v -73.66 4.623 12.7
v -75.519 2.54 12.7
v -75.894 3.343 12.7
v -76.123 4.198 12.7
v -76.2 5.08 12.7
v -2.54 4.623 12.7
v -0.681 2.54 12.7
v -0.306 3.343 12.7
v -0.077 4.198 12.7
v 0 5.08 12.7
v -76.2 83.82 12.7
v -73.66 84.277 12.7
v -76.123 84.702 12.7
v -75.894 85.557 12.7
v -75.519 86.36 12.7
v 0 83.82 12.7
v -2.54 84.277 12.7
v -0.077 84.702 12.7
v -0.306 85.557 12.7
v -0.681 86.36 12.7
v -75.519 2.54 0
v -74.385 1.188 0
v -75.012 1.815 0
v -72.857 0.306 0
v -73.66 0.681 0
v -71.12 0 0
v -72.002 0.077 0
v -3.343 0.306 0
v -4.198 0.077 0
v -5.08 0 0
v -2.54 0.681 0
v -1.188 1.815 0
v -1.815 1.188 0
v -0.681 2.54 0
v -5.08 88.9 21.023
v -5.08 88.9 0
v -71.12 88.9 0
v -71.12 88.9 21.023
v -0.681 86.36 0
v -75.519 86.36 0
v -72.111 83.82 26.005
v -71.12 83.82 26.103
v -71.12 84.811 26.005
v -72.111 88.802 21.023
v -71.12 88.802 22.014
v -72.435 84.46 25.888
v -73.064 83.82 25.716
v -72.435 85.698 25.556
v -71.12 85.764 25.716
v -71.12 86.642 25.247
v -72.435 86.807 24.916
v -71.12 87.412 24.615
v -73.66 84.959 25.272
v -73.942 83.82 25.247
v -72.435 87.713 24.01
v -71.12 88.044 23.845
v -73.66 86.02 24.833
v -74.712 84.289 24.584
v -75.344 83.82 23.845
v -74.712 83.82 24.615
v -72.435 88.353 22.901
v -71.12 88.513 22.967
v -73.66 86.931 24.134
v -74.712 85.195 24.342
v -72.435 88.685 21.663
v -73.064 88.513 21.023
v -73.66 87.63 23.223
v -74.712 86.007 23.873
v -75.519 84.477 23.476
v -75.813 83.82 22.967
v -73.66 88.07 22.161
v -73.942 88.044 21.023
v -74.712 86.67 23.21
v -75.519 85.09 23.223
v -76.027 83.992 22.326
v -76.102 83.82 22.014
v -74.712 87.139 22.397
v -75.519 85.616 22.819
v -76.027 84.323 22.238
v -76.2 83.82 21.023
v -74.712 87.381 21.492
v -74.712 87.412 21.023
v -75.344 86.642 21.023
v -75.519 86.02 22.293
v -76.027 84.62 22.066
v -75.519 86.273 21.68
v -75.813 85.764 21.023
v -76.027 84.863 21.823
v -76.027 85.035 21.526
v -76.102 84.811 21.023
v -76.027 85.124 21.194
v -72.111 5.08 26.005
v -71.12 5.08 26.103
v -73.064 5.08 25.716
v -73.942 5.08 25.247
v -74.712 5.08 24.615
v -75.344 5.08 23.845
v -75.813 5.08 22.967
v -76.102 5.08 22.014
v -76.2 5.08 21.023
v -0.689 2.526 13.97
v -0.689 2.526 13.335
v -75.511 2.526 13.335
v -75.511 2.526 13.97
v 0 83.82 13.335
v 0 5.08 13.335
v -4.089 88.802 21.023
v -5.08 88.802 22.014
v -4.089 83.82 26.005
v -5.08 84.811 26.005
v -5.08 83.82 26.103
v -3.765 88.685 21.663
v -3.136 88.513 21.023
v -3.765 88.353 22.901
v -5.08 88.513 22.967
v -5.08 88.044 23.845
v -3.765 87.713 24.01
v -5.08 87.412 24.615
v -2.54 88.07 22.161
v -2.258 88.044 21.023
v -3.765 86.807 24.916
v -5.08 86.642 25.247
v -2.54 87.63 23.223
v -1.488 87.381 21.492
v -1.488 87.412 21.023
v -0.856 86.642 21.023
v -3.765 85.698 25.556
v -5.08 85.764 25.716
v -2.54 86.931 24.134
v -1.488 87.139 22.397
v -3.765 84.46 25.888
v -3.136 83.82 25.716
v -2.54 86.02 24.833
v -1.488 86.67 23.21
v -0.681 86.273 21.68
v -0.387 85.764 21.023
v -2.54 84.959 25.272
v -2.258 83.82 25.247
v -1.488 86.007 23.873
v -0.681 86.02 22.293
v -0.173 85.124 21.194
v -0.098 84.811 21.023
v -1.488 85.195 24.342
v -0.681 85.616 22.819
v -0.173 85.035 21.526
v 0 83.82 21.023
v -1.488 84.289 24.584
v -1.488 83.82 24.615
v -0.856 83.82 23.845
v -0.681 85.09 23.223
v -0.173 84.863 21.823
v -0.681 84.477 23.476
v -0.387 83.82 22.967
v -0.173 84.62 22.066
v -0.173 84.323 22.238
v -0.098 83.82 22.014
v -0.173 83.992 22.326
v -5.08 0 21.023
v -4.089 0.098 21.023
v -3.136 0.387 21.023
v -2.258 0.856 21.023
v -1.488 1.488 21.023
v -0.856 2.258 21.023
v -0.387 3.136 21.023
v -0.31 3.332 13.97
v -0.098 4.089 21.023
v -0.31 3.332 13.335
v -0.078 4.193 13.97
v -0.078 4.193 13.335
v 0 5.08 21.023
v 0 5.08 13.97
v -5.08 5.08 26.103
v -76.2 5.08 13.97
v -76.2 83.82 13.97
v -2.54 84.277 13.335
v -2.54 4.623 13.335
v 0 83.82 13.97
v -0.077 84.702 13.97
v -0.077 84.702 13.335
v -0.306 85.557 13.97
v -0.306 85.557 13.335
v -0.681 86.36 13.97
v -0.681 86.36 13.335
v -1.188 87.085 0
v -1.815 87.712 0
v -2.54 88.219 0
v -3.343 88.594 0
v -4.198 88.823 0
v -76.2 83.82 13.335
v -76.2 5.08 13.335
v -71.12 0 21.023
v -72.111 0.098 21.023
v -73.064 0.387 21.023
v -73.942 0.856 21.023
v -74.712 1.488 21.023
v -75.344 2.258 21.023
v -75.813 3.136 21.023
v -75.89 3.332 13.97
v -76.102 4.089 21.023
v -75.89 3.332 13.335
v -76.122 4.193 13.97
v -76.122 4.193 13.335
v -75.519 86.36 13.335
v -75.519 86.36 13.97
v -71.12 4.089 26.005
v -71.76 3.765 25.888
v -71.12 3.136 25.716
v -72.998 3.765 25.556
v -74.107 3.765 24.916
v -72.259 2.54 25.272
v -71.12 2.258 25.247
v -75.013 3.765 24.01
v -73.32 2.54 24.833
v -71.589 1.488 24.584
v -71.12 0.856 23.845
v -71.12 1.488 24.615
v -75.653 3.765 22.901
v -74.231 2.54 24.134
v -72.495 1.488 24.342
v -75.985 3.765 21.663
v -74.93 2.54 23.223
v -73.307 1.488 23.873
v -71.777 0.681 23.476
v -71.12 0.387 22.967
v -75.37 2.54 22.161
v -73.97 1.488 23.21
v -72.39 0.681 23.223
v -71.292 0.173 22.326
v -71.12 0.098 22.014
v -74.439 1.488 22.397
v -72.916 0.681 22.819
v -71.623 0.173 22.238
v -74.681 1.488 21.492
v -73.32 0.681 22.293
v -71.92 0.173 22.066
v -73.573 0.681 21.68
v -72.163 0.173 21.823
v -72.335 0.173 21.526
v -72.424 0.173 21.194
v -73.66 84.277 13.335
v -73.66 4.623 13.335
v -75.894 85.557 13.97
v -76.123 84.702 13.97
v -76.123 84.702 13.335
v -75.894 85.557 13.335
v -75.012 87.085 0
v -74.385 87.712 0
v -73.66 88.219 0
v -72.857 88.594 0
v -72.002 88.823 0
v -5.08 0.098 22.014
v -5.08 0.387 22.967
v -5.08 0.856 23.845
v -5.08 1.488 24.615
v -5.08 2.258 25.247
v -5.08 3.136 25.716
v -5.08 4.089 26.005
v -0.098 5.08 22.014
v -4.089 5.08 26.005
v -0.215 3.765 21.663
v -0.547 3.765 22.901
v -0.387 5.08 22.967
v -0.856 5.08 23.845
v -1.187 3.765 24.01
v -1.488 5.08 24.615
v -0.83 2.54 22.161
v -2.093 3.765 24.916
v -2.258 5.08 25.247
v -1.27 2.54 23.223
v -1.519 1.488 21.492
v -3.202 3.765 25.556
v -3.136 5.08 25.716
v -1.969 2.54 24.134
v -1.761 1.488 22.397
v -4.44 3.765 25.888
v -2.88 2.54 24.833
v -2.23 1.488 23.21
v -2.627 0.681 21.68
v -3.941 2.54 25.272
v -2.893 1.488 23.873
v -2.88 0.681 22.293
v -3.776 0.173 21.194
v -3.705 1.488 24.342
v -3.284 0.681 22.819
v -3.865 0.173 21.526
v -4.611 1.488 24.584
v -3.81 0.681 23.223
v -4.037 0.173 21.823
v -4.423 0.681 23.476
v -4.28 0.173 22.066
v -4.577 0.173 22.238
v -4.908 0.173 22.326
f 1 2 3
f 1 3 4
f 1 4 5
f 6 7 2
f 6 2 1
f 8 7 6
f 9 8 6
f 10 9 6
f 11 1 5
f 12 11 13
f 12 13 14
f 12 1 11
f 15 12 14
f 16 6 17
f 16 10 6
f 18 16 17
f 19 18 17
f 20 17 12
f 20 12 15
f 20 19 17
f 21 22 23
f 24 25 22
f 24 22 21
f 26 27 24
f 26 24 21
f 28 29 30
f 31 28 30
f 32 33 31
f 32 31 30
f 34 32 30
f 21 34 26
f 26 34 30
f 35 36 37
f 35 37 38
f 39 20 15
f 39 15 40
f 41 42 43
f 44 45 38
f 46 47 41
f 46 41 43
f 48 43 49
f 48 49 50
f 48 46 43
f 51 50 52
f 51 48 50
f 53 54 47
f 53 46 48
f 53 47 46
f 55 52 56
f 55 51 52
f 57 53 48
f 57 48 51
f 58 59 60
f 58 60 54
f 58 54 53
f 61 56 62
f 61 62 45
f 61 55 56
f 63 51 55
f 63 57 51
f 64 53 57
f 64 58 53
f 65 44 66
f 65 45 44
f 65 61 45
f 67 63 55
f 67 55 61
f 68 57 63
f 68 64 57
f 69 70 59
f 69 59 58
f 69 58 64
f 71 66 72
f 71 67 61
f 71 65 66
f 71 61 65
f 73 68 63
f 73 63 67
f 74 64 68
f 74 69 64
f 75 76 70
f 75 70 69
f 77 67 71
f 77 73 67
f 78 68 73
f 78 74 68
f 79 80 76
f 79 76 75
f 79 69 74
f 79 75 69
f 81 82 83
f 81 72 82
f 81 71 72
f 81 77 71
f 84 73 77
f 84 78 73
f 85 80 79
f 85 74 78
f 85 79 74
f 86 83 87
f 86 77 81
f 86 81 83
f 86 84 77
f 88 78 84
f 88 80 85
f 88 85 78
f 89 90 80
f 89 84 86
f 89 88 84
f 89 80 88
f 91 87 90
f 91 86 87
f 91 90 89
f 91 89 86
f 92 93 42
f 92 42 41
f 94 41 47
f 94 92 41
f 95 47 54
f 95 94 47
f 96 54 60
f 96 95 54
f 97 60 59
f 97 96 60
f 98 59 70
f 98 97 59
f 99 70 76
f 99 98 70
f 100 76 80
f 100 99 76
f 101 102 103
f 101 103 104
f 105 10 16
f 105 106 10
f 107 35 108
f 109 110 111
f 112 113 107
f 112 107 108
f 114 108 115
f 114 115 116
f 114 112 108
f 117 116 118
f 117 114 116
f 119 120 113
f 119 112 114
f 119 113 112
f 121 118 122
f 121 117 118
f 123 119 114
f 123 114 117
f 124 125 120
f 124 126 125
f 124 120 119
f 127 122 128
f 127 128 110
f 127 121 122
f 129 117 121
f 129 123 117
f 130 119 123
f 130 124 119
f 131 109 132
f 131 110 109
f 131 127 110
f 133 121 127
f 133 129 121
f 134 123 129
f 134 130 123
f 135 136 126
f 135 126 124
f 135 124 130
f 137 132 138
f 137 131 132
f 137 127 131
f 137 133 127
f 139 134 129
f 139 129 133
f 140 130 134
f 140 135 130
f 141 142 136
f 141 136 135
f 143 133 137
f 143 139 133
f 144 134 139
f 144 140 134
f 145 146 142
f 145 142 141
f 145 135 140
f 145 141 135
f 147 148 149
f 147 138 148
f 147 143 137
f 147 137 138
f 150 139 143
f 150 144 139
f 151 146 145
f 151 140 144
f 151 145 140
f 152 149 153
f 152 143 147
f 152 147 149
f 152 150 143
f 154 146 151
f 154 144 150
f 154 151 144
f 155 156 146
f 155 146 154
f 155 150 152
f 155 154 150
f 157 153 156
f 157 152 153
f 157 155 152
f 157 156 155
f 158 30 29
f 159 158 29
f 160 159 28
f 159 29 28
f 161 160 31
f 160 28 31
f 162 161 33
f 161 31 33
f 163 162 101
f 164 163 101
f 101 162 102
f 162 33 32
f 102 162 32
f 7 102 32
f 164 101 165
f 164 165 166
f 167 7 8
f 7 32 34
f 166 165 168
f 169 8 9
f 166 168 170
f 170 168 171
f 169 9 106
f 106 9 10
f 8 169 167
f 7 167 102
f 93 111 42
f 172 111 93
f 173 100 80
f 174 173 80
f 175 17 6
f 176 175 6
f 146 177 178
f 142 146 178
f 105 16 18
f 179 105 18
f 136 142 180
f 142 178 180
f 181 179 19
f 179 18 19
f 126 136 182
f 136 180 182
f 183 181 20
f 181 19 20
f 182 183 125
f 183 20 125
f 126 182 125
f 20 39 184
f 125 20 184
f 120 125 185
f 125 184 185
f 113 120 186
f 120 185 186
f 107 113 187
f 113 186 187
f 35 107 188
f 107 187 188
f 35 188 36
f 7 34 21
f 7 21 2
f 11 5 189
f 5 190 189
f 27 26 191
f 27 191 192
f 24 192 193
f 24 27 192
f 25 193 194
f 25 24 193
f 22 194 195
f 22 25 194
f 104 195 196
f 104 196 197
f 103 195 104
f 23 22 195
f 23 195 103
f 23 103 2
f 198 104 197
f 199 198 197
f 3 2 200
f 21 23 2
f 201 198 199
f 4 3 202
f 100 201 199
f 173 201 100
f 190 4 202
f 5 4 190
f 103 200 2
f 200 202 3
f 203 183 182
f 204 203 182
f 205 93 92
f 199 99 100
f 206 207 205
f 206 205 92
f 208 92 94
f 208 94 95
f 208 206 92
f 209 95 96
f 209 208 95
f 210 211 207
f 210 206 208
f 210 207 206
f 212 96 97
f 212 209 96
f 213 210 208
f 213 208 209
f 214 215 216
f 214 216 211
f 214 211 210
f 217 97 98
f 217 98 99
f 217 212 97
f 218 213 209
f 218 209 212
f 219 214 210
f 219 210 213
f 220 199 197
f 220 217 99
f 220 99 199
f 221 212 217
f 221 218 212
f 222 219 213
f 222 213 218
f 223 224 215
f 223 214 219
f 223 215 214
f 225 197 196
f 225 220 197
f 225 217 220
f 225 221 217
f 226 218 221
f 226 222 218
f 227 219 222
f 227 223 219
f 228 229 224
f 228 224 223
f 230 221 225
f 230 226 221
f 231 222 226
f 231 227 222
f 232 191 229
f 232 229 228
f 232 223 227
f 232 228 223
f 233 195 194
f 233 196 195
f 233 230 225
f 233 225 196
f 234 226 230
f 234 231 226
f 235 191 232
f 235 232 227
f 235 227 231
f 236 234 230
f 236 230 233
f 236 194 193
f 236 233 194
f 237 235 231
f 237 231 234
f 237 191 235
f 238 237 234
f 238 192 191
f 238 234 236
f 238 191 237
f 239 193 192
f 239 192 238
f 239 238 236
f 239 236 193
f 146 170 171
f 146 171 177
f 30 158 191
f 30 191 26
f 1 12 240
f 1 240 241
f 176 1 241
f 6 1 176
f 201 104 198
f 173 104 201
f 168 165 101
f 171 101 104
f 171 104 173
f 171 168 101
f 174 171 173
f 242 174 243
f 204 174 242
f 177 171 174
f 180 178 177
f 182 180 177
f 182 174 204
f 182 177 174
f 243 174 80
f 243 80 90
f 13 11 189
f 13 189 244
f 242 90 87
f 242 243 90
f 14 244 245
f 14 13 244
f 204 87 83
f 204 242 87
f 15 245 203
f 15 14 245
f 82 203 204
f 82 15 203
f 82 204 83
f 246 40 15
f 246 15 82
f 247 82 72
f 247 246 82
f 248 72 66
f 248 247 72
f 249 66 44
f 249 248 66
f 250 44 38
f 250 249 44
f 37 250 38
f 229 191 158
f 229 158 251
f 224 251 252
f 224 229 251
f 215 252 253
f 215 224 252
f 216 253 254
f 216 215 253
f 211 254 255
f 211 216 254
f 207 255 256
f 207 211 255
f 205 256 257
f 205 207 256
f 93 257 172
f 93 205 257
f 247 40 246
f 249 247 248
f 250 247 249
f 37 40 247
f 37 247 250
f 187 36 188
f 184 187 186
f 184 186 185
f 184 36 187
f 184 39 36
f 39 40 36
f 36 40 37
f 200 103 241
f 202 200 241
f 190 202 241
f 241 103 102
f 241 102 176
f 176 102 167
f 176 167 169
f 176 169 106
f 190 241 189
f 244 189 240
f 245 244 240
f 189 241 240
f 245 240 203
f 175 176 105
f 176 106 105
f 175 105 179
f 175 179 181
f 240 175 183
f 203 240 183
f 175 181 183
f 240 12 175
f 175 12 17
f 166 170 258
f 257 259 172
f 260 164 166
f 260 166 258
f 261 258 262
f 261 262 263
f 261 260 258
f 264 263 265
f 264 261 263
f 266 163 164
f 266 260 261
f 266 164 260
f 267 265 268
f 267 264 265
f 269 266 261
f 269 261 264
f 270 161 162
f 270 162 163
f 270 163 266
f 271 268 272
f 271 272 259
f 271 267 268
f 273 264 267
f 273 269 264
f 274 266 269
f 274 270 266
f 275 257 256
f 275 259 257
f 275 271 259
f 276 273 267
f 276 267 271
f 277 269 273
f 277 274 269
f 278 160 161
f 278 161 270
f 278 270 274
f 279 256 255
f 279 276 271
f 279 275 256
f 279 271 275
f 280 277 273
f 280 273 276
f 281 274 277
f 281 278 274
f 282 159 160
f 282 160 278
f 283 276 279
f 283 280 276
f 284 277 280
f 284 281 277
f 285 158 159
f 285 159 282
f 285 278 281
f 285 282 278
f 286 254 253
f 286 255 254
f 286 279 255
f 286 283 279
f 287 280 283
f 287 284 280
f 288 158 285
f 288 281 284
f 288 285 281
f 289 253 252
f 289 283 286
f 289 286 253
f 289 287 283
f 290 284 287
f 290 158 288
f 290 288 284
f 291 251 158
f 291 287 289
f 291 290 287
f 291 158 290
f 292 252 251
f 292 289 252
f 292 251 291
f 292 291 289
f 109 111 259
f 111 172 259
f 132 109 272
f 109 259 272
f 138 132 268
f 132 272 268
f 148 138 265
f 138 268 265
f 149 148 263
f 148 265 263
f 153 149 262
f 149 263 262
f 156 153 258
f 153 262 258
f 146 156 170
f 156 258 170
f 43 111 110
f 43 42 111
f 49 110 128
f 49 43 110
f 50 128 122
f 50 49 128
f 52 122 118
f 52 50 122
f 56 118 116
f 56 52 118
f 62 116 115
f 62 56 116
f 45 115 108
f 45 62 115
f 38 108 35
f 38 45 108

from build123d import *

# Parameters (mm, degrees)
F1_DEPTH     = 76.2
F2_W         = 83.8339800673
F2_H         = 0.635
F3_DEPTH     = 76.201
F4_W         = 71.12
F4_H         = 79.6544
F5_DEPTH     = 1.27
F6_R         = 5.08
F7_T1_DEPTH  = 33.7228350816
F7_S5_W      = 5.08
F7_S5_H      = 5.08
F7_T6_DEPTH  = 5.08
F8_T1_DEPTH  = 33.7228350816
F8_S5_W      = 5.08
F8_S5_H      = 5.08
F8_T6_DEPTH  = 5.08
F9_T1_DEPTH  = 33.7228350816
F9_S5_W      = 5.08
F9_S5_H      = 5.08
F9_T6_DEPTH  = 5.08
F10_T1_DEPTH = 33.7228350816
F10_S5_W     = 5.08
F10_S5_H     = 5.08
F10_T6_DEPTH = 5.08


# Not quite as in the source:
# - a fillet or chamfer that OpenCascade refuses, or shapes differently, is made with other operations: its cross-section is extruded or revolved along the edge and cut away or added


with BuildPart() as f1:
    # F0 (on Right) → F1 (new body)
    with BuildSketch(Plane.YZ):
        Polygon((0, 26.1028350816), (0, 0), (2.54, 0), (2.54, 12.7), (86.36, 12.7), (86.36, 0), (88.9, 0), (88.9, 26.1028350816), align=None)
    extrude(amount=-F1_DEPTH)

    # F2 (on face) → F3 (cut, through all)
    with BuildSketch(Plane.YZ):
        with Locations((44.4430099664, 13.6525)):
            Rectangle(F2_W, F2_H)
    extrude(amount=-F3_DEPTH, mode=Mode.SUBTRACT)

    # F4 (on face) → F5 (cut)
    with BuildSketch(Plane(origin=(0, 0, 12.7), x_dir=(1, 0, 0), z_dir=(0, 0, -1))):
        with Locations((-38.1, -44.45)):
            Rectangle(F4_W, F4_H)
    extrude(amount=-F5_DEPTH, mode=Mode.SUBTRACT)

    # F6
    f6_edges = [f1.edges().sort_by_distance(p)[0] for p in [
        (-38.1, 0, 26.102835),
        (0, 44.45, 26.102835),
        (-38.1, 88.9, 26.102835),
        (-76.2, 44.45, 26.102835),
    ]]
    fillet(f6_edges, radius=F6_R)

    # F7: fillet of radius 5.08 on 1 edges, made by hand

    # F7_s2 → F7_t1 (cut)
    with BuildSketch(Plane.XY.offset(-12.7)):
        with BuildLine():
            ThreePointArc((-5.08, 0), (-1.4878975516, 1.4878975516), (0, 5.08))
            Line((0, 5.08), (0, 0))
            Line((0, 0), (-5.08, 0))
        make_face()
    extrude(amount=F7_T1_DEPTH, mode=Mode.SUBTRACT)


with BuildPart() as f7_tool4:
    # F7_s5 → F7_t6 (new body)
    with BuildSketch(Plane.XZ.offset(-5.08)):
        with Locations((-2.54, 23.5628350816)):
            Rectangle(F7_S5_W, F7_S5_H)
    extrude(amount=F7_T6_DEPTH)

    # F7_s7 → F7_t8 (revolve, cut)
    with BuildSketch(Plane(origin=(-5.08, 5.08, 21.0228350816), x_dir=(-0.7071067812, 0, -0.7071067812), z_dir=(-0.7071067812, 0, 0.7071067812))):
        with BuildLine():
            ThreePointArc((0, -5.08), (5.08, 0), (0, 5.08))
            Line((0, 5.08), (0, -5.08))
        make_face()
    revolve(axis=Axis((-5.08, 5.08, 21.0228350816), (0, -1, 0)), mode=Mode.SUBTRACT)


with BuildPart() as f1_1:
    add(f1.part)

    # F7_t3: cut F7_tool4
    add(f7_tool4.part, mode=Mode.SUBTRACT)

    # F8: fillet of radius 5.08 on 1 edges, made by hand

    # F8_s2 → F8_t1 (cut)
    with BuildSketch(Plane.XY.offset(-12.7)):
        with BuildLine():
            ThreePointArc((0, 83.82), (-1.4878975516, 87.4121024484), (-5.08, 88.9))
            Line((-5.08, 88.9), (0, 88.9))
            Line((0, 88.9), (0, 83.82))
        make_face()
    extrude(amount=F8_T1_DEPTH, mode=Mode.SUBTRACT)


with BuildPart() as f8_tool4:
    # F8_s5 → F8_t6 (new body)
    with BuildSketch(Plane.YZ.offset(-5.08)):
        with Locations((86.36, 23.5628350816)):
            Rectangle(F8_S5_W, F8_S5_H)
    extrude(amount=F8_T6_DEPTH)

    # F8_s7 → F8_t8 (revolve, cut)
    with BuildSketch(Plane(origin=(-5.08, 83.82, 21.0228350816), x_dir=(0, -0.7071067812, -0.7071067812), z_dir=(0, -0.7071067812, 0.7071067812))):
        with BuildLine():
            ThreePointArc((0, -5.08), (5.08, 0), (0, 5.08))
            Line((0, 5.08), (0, -5.08))
        make_face()
    revolve(axis=Axis((-5.08, 83.82, 21.0228350816), (1, 0, 0)), mode=Mode.SUBTRACT)


with BuildPart() as f1_2:
    add(f1_1.part)

    # F8_t3: cut F8_tool4
    add(f8_tool4.part, mode=Mode.SUBTRACT)

    # F9: fillet of radius 5.08 on 1 edges, made by hand

    # F9_s2 → F9_t1 (cut)
    with BuildSketch(Plane.XY.offset(-12.7)):
        with BuildLine():
            ThreePointArc((-71.12, 0), (-74.7121024484, 1.4878975516), (-76.2, 5.08))
            Line((-76.2, 5.08), (-76.2, 0))
            Line((-76.2, 0), (-71.12, 0))
        make_face()
    extrude(amount=F9_T1_DEPTH, mode=Mode.SUBTRACT)


with BuildPart() as f9_tool4:
    # F9_s5 → F9_t6 (new body)
    with BuildSketch(Plane.XZ.offset(-5.08)):
        with Locations((-73.66, 23.5628350816)):
            Rectangle(F9_S5_W, F9_S5_H)
    extrude(amount=F9_T6_DEPTH)

    # F9_s7 → F9_t8 (revolve, cut)
    with BuildSketch(Plane(origin=(-71.12, 5.08, 21.0228350816), x_dir=(0.7071067812, 0, -0.7071067812), z_dir=(-0.7071067812, 0, -0.7071067812))):
        with BuildLine():
            ThreePointArc((0, -5.08), (5.08, 0), (0, 5.08))
            Line((0, 5.08), (0, -5.08))
        make_face()
    revolve(axis=Axis((-71.12, 5.08, 21.0228350816), (0, -1, 0)), mode=Mode.SUBTRACT)


with BuildPart() as f1_3:
    add(f1_2.part)

    # F9_t3: cut F9_tool4
    add(f9_tool4.part, mode=Mode.SUBTRACT)

    # F10: fillet of radius 5.08 on 1 edges, made by hand

    # F10_s2 → F10_t1 (cut)
    with BuildSketch(Plane.XY.offset(-12.7)):
        with BuildLine():
            ThreePointArc((-76.2, 83.82), (-74.7121024484, 87.4121024484), (-71.12, 88.9))
            Line((-71.12, 88.9), (-76.2, 88.9))
            Line((-76.2, 88.9), (-76.2, 83.82))
        make_face()
    extrude(amount=F10_T1_DEPTH, mode=Mode.SUBTRACT)


with BuildPart() as f10_tool4:
    # F10_s5 → F10_t6 (new body)
    with BuildSketch(Plane.YZ.offset(-71.12)):
        with Locations((86.36, 23.5628350816)):
            Rectangle(F10_S5_W, F10_S5_H)
    extrude(amount=-F10_T6_DEPTH)

    # F10_s7 → F10_t8 (revolve, cut)
    with BuildSketch(Plane(origin=(-71.12, 83.82, 21.0228350816), x_dir=(0, -0.7071067812, -0.7071067812), z_dir=(0, 0.7071067812, -0.7071067812))):
        with BuildLine():
            ThreePointArc((0, -5.08), (5.08, 0), (0, 5.08))
            Line((0, 5.08), (0, -5.08))
        make_face()
    revolve(axis=Axis((-71.12, 83.82, 21.0228350816), (-1, 0, 0)), mode=Mode.SUBTRACT)


with BuildPart() as f1_4:
    add(f1_3.part)

    # F10_t3: cut F10_tool4
    add(f10_tool4.part, mode=Mode.SUBTRACT)


solid = f1_4.part
